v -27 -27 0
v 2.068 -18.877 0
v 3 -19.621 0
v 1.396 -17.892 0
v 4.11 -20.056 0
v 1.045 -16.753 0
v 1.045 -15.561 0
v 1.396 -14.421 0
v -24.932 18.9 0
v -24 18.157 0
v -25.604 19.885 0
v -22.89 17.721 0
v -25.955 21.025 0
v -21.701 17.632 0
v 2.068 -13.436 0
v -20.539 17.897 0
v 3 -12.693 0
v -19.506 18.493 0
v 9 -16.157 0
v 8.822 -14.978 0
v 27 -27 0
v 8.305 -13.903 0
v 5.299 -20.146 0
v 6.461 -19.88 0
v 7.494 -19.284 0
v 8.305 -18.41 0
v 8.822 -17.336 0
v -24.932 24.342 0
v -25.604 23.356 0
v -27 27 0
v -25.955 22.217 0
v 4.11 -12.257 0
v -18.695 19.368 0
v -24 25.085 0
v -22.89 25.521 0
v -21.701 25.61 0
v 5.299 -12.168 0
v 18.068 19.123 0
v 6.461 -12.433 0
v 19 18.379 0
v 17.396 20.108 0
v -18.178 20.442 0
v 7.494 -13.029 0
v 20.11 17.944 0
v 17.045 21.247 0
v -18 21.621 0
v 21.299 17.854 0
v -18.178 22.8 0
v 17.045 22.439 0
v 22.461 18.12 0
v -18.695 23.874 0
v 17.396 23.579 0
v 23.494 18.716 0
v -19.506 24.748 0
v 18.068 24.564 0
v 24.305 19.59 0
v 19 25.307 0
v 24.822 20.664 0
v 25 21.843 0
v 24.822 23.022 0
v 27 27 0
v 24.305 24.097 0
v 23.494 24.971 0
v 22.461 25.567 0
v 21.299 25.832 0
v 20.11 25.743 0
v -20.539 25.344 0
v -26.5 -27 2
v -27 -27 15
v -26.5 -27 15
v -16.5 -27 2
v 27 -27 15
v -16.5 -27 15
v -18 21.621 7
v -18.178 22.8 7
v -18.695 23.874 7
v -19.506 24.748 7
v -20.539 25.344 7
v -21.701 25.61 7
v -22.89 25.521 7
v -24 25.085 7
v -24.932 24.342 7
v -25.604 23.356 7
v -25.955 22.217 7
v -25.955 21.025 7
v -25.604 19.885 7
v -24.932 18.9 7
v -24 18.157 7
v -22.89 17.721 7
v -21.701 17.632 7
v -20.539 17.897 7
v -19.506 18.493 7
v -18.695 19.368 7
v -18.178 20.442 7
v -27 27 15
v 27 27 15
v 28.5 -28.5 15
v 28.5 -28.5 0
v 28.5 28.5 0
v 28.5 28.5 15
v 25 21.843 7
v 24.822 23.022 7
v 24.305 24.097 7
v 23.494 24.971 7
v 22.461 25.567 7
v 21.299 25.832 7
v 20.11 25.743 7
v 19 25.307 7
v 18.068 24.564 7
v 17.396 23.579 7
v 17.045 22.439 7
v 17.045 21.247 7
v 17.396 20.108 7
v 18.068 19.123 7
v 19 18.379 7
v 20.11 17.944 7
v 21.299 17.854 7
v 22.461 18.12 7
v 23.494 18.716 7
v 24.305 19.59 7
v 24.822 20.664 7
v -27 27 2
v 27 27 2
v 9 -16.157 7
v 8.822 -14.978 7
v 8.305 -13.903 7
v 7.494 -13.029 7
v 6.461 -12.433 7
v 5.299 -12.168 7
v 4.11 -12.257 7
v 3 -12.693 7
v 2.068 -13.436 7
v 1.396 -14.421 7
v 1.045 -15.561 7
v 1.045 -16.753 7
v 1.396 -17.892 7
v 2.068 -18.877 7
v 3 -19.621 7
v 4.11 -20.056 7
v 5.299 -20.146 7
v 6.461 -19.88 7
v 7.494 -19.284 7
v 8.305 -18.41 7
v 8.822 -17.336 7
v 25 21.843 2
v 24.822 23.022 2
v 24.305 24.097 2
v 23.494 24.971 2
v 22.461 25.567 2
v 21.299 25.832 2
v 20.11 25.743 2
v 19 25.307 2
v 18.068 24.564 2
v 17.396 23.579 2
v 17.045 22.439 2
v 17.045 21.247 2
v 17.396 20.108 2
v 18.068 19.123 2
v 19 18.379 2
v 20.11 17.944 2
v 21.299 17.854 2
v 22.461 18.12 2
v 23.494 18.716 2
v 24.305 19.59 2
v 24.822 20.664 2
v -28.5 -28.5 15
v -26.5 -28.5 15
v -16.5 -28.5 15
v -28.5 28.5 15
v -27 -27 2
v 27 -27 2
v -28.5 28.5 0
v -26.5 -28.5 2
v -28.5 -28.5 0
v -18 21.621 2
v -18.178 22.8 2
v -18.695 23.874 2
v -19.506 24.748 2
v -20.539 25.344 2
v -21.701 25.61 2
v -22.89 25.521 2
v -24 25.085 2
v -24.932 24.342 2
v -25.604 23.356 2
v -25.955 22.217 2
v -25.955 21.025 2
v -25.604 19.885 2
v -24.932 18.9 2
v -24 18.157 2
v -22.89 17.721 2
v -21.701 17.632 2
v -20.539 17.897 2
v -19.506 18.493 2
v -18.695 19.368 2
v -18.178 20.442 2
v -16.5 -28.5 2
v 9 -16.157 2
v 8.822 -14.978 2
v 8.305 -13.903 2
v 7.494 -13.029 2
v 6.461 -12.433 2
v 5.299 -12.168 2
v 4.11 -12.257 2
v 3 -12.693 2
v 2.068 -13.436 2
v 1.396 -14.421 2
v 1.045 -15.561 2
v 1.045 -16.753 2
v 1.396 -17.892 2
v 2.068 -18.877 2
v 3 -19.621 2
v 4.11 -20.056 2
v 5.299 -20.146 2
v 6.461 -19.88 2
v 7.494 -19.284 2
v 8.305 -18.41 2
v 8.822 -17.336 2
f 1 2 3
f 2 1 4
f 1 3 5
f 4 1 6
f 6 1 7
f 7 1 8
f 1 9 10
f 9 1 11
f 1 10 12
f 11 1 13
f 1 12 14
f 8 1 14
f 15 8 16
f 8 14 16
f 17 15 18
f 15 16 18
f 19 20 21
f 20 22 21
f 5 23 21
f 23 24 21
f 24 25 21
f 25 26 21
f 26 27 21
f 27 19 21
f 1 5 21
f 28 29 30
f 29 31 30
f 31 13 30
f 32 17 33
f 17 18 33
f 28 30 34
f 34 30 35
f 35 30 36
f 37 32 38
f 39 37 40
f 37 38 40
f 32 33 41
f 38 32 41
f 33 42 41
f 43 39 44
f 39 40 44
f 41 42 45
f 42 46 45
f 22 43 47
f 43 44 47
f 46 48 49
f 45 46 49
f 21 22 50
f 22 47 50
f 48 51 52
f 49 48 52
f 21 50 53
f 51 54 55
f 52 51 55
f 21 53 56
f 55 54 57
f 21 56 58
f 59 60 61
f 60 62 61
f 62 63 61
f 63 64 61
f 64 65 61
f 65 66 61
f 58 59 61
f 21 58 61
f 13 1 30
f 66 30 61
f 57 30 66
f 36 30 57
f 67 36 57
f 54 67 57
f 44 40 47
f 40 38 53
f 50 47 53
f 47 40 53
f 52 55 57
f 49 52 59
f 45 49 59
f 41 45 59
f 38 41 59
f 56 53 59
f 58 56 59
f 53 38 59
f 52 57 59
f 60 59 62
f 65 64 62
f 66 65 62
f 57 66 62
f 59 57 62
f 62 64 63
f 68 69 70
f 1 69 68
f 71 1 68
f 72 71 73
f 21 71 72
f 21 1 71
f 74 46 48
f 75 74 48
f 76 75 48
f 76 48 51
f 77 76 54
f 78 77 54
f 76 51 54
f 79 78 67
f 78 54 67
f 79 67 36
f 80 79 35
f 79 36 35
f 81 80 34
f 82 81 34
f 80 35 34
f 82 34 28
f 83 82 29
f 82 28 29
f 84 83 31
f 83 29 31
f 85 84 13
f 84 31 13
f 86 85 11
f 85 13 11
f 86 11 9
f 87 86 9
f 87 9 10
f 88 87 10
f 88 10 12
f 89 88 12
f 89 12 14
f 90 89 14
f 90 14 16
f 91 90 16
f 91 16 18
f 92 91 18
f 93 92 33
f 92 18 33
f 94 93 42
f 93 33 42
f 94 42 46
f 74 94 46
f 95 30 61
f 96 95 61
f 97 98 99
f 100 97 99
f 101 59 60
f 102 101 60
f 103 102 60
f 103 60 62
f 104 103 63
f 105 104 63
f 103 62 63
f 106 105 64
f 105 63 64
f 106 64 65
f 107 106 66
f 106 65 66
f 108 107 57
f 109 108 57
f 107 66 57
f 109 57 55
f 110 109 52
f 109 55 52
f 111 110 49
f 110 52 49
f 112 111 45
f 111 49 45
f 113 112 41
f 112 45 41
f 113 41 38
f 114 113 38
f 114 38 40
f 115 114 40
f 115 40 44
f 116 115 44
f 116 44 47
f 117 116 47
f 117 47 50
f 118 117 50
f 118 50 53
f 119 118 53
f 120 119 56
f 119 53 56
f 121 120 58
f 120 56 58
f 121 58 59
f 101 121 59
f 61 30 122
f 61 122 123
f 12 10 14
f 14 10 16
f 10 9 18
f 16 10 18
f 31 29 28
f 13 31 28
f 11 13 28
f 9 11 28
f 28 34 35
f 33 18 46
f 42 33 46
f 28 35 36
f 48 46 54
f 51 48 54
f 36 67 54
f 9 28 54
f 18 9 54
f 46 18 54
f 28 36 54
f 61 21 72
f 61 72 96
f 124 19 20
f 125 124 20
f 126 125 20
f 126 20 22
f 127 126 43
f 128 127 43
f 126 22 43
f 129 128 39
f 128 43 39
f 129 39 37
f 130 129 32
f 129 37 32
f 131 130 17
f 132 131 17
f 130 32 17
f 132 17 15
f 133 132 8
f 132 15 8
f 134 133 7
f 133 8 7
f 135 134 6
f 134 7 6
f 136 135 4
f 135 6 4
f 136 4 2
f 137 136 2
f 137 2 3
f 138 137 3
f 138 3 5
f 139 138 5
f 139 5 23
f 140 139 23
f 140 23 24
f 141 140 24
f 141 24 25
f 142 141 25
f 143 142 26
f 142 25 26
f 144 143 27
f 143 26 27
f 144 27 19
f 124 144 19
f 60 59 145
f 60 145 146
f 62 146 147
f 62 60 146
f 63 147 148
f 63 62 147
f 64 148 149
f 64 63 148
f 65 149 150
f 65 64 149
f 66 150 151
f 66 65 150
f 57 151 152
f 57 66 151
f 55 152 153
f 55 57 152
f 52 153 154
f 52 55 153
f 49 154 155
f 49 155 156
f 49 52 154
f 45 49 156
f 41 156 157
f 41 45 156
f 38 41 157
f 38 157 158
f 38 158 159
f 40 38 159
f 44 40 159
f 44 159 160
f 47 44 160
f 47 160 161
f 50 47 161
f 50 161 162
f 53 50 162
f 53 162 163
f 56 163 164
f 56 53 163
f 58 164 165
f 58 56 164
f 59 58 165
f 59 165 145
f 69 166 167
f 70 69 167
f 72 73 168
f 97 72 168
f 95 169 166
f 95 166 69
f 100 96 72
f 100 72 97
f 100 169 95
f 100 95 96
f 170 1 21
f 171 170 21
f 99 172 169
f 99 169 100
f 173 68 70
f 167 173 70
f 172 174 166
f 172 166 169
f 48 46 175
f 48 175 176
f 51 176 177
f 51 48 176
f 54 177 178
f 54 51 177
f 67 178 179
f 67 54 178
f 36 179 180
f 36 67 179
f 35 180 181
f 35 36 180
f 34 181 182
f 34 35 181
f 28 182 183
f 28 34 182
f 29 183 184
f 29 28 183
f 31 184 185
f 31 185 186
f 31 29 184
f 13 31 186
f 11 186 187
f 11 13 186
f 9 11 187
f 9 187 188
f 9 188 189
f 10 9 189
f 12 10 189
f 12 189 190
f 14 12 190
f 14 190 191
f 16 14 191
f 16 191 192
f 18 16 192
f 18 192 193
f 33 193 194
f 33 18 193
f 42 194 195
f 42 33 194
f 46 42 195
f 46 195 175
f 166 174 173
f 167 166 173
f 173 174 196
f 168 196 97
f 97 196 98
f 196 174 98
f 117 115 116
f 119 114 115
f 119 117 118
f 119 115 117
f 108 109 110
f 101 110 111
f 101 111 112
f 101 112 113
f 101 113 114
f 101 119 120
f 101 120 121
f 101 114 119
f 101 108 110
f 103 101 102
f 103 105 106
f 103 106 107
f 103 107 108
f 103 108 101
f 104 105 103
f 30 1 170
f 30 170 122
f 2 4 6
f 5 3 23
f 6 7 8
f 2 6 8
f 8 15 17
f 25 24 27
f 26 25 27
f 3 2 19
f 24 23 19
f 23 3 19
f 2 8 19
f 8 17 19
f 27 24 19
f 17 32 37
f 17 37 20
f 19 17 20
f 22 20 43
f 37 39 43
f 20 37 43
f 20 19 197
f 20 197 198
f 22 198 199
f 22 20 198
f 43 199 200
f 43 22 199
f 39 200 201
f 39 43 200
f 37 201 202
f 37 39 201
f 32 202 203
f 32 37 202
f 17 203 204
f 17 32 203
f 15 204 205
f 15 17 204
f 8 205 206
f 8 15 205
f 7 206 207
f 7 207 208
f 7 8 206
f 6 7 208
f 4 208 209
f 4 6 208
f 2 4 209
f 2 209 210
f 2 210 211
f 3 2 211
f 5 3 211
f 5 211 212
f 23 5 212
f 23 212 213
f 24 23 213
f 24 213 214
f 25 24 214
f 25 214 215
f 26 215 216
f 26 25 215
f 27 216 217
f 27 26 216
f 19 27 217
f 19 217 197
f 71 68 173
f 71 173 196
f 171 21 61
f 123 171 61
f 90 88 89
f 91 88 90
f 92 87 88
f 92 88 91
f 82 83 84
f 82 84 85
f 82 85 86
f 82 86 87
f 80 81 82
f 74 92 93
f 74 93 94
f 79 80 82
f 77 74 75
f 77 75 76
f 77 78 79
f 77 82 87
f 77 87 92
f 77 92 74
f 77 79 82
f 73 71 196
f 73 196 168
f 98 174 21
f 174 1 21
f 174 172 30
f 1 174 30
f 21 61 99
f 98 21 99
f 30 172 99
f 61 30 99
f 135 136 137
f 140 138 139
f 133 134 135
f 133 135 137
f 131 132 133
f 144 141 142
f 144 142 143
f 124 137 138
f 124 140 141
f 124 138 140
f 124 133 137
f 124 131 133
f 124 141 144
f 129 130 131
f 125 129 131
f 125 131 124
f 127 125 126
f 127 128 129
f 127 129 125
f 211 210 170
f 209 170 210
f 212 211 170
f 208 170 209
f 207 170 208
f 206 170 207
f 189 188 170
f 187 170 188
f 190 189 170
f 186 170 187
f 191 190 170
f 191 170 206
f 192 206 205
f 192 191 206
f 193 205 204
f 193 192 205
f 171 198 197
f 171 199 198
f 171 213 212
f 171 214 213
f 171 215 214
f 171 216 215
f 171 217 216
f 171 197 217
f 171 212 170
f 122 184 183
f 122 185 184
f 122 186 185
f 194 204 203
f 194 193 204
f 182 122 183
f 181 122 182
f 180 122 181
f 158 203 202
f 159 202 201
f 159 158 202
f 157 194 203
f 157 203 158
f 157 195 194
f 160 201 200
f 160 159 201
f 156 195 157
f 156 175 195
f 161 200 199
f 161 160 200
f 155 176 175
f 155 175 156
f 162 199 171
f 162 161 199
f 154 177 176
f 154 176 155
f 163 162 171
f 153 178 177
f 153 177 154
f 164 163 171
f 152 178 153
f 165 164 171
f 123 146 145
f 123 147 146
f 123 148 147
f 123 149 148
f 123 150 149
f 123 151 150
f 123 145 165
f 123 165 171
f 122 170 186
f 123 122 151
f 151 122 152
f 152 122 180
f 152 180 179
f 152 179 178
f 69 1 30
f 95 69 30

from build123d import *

# Parameters (mm, degrees)
F0_W      = 57
F0_H      = 57
F0_W_2    = 54
F0_H_2    = 54
F1_DEPTH  = 15
F0_R      = 4
F2_DEPTH  = 7
F3_DEPTH  = 2
F4_W      = 10
F4_H      = 14
F1_FACE_W = 57
F1_FACE_H = 15
F5_DEPTH  = 28.501


with BuildPart() as f1:
    # F0 (on Top) → F1 (new body)
    with BuildSketch(Plane.XY):
        Rectangle(F0_W, F0_H)
        Rectangle(F0_W_2, F0_H_2, mode=Mode.SUBTRACT)
    extrude(amount=F1_DEPTH)

    # F4 (on Front) + F1_face (on face) → F5 (cut, through all)
    with BuildSketch(Plane.XZ):
        with Locations((-21.5, 9)):
            Rectangle(F4_W, F4_H)
    with BuildSketch(Plane(origin=(0, -28.5, 7.5), x_dir=(1, 0, 0), z_dir=(0, -1, 0))):
        Rectangle(F1_FACE_W, F1_FACE_H)
    extrude(amount=F5_DEPTH, mode=Mode.SUBTRACT)


with BuildPart() as f2:
    # F0 (on Top) → F2 (new body)
    with BuildSketch(Plane.XY):
        with Locations((-22, 21.620819)):
            Circle(F0_R)
        with Locations((21, 21.843243)):
            Circle(F0_R)
        with Locations((5, -16.156757)):
            Circle(F0_R)
    extrude(amount=F2_DEPTH)


with BuildPart() as f3:
    # F0 (on Top) → F3 (new body)
    with BuildSketch(Plane.XY):
        Rectangle(F0_W_2, F0_H_2)
        with Locations((5, -16.156757)):
            Circle(F0_R, mode=Mode.SUBTRACT)
        with Locations((-22, 21.620819)):
            Circle(F0_R, mode=Mode.SUBTRACT)
        with Locations((21, 21.843243)):
            Circle(F0_R, mode=Mode.SUBTRACT)
    extrude(amount=F3_DEPTH)


solid = Compound([f1.part, f2.part, f3.part])
